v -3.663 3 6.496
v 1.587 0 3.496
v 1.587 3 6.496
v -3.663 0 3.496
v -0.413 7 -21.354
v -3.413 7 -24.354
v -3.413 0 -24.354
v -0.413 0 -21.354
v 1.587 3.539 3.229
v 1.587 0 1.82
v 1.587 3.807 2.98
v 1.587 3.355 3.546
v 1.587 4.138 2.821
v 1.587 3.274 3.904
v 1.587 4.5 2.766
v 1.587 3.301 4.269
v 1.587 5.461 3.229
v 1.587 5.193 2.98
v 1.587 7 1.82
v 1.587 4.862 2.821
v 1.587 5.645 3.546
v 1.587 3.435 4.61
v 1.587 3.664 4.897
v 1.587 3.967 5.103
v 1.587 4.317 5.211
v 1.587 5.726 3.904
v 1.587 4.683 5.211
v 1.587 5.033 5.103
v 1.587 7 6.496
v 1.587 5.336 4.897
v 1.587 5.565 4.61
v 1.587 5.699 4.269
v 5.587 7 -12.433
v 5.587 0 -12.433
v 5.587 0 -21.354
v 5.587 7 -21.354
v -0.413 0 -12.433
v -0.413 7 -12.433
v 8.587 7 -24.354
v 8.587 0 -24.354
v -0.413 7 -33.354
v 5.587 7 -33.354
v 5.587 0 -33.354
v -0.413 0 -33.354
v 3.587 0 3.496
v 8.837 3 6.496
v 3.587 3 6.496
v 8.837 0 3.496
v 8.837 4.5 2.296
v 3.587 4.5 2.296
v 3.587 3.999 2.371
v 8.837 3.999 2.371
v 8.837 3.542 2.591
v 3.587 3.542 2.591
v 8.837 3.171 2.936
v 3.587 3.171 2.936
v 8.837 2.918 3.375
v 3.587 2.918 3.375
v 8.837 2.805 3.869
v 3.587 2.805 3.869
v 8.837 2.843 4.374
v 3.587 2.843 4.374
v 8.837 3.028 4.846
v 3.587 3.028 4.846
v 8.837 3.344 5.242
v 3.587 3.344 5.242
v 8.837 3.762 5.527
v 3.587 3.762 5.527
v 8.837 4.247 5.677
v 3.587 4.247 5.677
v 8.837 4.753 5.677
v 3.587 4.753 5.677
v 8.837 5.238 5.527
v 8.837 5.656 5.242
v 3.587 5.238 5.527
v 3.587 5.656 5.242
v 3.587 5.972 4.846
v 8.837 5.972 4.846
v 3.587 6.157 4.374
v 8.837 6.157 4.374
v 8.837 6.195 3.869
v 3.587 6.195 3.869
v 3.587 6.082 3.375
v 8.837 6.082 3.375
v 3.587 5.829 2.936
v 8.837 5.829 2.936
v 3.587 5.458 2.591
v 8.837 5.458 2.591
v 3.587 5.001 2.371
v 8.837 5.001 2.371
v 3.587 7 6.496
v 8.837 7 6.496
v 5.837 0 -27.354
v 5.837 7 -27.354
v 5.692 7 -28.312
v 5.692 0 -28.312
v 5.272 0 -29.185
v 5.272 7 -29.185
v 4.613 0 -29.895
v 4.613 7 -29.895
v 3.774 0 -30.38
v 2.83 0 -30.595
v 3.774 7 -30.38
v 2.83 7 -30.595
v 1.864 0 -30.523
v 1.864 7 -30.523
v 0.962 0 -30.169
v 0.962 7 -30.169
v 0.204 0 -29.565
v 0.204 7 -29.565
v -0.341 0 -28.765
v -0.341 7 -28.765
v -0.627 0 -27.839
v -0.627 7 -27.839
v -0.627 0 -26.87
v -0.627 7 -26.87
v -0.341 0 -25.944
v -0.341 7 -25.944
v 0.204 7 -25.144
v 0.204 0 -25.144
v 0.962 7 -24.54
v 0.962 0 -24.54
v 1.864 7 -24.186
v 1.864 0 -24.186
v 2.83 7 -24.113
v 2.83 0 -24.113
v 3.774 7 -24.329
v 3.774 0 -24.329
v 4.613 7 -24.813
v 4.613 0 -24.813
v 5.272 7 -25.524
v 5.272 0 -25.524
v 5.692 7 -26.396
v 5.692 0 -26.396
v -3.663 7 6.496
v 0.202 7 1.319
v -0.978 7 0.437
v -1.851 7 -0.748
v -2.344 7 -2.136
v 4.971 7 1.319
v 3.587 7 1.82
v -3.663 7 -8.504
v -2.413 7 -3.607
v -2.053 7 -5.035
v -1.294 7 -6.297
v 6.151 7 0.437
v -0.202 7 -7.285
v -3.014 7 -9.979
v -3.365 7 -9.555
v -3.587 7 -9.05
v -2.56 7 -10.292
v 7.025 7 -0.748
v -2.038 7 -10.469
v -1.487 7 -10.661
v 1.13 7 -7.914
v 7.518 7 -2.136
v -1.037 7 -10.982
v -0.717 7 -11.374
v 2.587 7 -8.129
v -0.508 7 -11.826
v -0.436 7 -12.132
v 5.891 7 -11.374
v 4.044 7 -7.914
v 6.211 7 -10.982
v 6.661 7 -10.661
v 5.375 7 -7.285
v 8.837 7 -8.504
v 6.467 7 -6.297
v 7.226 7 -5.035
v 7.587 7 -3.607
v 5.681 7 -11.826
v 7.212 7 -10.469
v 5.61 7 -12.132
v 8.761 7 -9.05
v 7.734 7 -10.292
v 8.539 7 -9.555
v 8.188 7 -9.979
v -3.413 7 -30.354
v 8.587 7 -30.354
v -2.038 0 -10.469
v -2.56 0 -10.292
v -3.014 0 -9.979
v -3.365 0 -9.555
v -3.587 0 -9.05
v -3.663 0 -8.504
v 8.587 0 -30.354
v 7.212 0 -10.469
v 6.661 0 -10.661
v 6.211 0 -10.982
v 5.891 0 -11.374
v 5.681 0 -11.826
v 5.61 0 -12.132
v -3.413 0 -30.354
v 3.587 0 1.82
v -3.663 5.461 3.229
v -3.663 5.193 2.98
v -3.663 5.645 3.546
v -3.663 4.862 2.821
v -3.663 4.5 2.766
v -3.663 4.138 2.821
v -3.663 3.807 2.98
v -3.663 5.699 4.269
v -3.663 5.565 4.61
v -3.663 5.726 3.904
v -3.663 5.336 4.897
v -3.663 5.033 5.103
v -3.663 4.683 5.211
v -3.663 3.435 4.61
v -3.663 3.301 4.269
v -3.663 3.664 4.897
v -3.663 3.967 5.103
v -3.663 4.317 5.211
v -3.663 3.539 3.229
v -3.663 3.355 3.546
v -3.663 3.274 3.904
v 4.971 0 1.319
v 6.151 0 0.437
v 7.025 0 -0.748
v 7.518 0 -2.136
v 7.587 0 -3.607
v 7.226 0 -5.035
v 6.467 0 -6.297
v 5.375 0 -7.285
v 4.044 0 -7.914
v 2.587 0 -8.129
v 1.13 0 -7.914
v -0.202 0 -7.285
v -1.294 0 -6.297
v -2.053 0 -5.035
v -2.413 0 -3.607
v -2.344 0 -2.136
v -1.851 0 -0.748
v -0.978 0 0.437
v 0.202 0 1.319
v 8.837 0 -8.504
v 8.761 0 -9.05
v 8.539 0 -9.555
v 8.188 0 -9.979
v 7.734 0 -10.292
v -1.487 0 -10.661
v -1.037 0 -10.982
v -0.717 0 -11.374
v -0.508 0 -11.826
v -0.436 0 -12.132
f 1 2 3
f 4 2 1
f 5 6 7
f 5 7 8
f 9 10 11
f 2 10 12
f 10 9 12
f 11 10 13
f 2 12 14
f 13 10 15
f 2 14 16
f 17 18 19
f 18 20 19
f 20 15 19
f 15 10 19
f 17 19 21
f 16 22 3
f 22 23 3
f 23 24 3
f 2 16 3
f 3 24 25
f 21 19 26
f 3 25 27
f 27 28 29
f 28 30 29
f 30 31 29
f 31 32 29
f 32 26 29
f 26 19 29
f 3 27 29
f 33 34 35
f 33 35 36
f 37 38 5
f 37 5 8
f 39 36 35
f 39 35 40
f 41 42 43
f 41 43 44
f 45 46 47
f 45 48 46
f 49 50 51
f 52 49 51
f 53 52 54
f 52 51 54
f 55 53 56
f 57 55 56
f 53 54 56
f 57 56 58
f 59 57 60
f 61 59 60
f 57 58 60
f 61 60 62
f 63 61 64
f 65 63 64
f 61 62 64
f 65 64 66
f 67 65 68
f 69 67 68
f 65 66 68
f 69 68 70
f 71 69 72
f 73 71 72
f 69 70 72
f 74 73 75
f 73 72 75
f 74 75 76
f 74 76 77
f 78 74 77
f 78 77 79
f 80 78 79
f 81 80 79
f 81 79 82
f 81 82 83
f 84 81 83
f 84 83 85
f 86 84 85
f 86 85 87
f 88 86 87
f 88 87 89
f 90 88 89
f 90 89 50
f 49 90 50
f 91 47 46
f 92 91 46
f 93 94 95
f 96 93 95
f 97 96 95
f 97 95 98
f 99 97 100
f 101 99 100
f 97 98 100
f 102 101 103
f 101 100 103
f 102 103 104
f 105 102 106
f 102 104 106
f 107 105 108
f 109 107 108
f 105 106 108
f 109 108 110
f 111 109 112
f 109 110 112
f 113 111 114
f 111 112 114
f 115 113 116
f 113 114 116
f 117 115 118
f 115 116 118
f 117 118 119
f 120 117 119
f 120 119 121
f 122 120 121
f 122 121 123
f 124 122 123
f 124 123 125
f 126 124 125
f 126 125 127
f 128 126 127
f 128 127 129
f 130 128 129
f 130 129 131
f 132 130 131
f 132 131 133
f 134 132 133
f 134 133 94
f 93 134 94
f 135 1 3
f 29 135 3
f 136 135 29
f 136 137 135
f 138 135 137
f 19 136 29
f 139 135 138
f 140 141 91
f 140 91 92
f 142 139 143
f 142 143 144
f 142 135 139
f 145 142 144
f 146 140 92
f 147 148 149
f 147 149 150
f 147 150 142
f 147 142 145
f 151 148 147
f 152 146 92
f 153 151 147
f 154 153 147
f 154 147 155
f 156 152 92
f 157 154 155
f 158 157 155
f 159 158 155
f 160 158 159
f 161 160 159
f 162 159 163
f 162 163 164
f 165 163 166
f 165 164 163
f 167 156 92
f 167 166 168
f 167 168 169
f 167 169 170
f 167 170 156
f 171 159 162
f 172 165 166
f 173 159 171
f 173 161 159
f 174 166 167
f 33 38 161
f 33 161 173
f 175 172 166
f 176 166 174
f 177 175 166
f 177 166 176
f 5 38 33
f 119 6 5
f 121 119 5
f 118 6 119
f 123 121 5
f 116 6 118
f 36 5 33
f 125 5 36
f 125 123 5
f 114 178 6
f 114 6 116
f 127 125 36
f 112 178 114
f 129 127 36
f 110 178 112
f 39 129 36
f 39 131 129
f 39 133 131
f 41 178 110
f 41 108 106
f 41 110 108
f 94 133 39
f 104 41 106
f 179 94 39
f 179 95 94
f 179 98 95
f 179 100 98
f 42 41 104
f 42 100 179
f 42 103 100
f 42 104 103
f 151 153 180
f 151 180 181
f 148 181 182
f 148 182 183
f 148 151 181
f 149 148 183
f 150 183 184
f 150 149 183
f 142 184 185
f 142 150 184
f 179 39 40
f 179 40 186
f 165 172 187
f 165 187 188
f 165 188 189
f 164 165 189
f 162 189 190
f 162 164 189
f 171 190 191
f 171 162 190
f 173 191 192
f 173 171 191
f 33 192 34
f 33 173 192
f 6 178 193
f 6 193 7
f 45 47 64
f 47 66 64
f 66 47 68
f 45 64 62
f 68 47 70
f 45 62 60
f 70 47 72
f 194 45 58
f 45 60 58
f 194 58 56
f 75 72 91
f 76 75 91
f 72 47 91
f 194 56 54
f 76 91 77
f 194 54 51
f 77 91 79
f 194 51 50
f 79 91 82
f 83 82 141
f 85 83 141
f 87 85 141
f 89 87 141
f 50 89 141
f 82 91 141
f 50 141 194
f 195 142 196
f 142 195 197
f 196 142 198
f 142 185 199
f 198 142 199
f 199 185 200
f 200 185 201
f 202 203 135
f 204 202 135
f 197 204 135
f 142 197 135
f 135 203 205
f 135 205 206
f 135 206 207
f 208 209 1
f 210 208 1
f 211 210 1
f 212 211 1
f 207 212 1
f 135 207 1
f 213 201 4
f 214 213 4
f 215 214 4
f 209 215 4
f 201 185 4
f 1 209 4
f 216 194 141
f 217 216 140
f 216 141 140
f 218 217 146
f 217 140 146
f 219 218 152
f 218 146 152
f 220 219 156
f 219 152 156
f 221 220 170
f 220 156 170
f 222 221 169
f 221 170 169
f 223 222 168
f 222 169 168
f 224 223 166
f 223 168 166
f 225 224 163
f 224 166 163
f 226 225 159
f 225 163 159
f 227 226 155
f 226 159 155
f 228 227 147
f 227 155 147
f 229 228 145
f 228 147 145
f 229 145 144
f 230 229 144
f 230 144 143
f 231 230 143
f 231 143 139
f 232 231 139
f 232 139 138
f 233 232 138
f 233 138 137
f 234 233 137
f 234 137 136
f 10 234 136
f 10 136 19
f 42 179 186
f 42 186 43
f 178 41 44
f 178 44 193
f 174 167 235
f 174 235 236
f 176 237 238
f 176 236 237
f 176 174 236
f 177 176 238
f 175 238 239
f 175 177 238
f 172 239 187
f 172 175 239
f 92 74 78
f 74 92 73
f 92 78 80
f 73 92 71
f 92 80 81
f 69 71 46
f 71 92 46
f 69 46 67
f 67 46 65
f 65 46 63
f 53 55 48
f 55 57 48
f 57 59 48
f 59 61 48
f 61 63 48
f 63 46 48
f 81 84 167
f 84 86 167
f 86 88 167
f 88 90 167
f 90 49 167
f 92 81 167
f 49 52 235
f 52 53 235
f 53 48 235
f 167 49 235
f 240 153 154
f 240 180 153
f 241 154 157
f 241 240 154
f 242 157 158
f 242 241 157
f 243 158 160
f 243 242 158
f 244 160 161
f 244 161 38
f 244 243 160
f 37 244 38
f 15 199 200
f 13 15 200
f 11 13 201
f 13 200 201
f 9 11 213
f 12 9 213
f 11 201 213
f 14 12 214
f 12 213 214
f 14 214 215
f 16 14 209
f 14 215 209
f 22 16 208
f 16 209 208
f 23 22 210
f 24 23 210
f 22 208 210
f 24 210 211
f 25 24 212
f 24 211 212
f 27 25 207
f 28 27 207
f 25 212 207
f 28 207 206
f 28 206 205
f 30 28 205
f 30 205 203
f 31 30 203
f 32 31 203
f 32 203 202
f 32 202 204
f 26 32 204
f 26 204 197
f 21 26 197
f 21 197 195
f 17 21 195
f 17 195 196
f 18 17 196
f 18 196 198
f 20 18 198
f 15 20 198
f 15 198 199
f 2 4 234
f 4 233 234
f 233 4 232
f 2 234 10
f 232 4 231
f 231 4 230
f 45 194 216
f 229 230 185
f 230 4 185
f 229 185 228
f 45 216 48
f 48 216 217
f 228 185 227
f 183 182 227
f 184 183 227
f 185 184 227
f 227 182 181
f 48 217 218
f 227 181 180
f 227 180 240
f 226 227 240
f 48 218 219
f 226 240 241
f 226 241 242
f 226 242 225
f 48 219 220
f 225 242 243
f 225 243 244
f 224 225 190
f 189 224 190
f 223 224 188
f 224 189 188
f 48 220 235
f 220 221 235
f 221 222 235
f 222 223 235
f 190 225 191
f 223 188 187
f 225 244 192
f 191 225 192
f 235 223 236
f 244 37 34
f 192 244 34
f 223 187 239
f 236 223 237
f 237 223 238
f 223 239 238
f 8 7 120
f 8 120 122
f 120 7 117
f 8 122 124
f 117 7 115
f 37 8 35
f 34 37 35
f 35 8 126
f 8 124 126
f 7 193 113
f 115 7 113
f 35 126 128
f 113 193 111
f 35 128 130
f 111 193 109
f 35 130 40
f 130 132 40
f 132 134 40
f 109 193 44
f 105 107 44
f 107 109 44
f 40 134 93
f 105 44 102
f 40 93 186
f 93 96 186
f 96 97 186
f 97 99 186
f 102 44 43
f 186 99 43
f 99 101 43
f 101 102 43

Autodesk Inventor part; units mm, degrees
ref_plane "YZ Plane" through (0, 0, 0) normal (1, 0, 0) x (0, 1, 0)
ref_plane "XZ Plane" through (0, 0, 0) normal (0, 1, 0) x (-1, 0, 0)
ref_plane "XY Plane" through (0, 0, 0) normal (0, 0, 1) x (1, 0, 0)
sketch "Sketch1" plane through (0, 0, 0) normal (0, 1, 0) x (-1, 0, 0)
  line L0 (3.6632, 6.4956) -> (-8.8368, 6.4956)
  line L1 (-8.8368, 6.4956) -> (-8.8368, -10.5044)
  line L2 (-8.8368, -10.5044) -> (3.6632, -10.5044)
  line L3 (3.6632, -10.5044) -> (3.6632, 6.4956)
  line L4 (0.9132, -10.5044) -> (-6.0868, -10.5044)
  point P0 (0, 0)
  dimension "d0" = 17
  dimension "d1" = 12.5
extrude "Extrusion1" add sketch "Sketch1" along normal blind 7
chamfer "Chamfer1" distance 3 angle 45 1 edges at (2.5868, 0, 6.4956)
sketch "Sketch2" plane through (0, 7, 0) normal (0, 1, 0) x (1, 0, 0)
  circle A0 centre (2.5868, 3.1044) radius 5.025
  line L0 (8.8368, -6.4956) -> (8.8368, 10.5044) projected
  line L1 (-3.6632, -6.4956) -> (8.8368, -6.4956) projected
  point P0 (0, 0)
  dimension "d7" = 10.05
  dimension "d8" = 6.25
  dimension "d9" = 9.6
extrude "Extrusion2" cut sketch "Sketch2" against normal up to next
sketch "Sketch3" plane through (0, 7, 0) normal (0, 1, 0) x (1, 0, 0)
  line L0 (-3.6632, -6.4956) -> (8.8368, -6.4956) projected
  line L1 (1.5868, -6.4956) -> (3.5868, -6.4956)
  line L2 (3.5868, -6.4956) -> (3.5868, 0)
  line L3 (3.5868, 0) -> (1.5868, 0)
  line L4 (1.5868, 0) -> (1.5868, -6.4956)
  line L5 (8.8368, -6.4956) -> (8.8368, 10.5044) projected
  line L6 (-3.6632, 10.5044) -> (-3.6632, -6.4956) projected
  point P0 (0, 0)
  dimension "d16" = 2
  dimension "d17" = 12.5
  dimension "d18" = 5.25
extrude "Extrusion3" cut sketch "Sketch3" against normal through all
sketch "Sketch4" plane through (8.8368, 0, -10.5044) normal (1, 0, 0) x (0, 0, -1)
  line L0 (-17, 3) -> (-17, 7) projected
  line L1 (-17, 7) -> (0, 7) projected
  point P0 (-10.5044, 0)
  point P1 (-14.5, 4.5)
  dimension "d26" = 2.5
  dimension "d27" = 2.5
hole "Hole1" at (8.8368, 4.5, 3.9956) direction (-1, 0, 0) diameter 3.4 depth 5.25 clearance for "Flat Head Machine Screw" size "M3" standard "Ansi Metric M Profile"
sketch "Sketch5" plane through (1.5868, 7, 6.4956) normal (1, 0, 0) x (0, 0, -1)
  line L0 (0, 0) -> (17, 0) projected
  line L1 (0, -4) -> (0, 0) projected
  point P0 (6.4956, -7)
  point P1 (2.5, -2.5)
  dimension "d35" = 2.5
  dimension "d36" = 2.5
hole "Hole2" at (1.5868, 4.5, 3.9956) direction (-1, 0, 0) diameter 2.459 depth 5.25 thread size "M3x0.5" class "6H" standard "ANSI Metric M Profile"
sketch "Sketch6" plane through (8.8368, 0, -10.5044) normal (0, 0, -1) x (-1, 0, 0)
  line L0 (5.25, 7) -> (0, 7) projected
  line L1 (3.25, 7) -> (9.25, 7)
  line L2 (9.25, 7) -> (9.25, 0)
  line L3 (9.25, 0) -> (3.25, 0)
  line L4 (3.25, 0) -> (3.25, 7)
  line L5 (0, 0) -> (0, 7) projected
  point P0 (8.8368, 0)
  dimension "d40" = 6
  dimension "d41" = 7
  dimension "d42" = 3.25
extrude "Extrusion4" add sketch "Sketch6" along normal blind 10.85
fillet "Fillet1" radius 2 1 edges at (8.8368, 3.5, -10.5044)
fillet "Fillet2" radius 2 1 edges at (5.5868, 3.5, -10.5044)
fillet "Fillet3" radius 2 2 edges at (-3.6632, 3.5, -10.5044) (-0.4132, 3.5, -10.5044)
sketch "Sketch7" plane through (0, 7, 0) normal (0, 1, 0) x (1, 0, 0)
  point P0 (0, 0)
sketch "Sketch8" plane through (8.8368, 0, -21.3544) normal (0, 0, -1) x (-1, 0, 0)
  point P0 (8.8368, 0)
sketch "Sketch9" plane through (0, 7, 0) normal (0, 1, 0) x (1, 0, 0)
  line L0 (5.5868, 21.3544) -> (-0.4132, 21.3544) projected
  line L1 (5.5868, 21.3544) -> (8.5868, 24.3544)
  line L2 (8.5868, 24.3544) -> (8.5868, 30.3544)
  line L3 (-3.4132, 30.3544) -> (-3.4132, 24.3544)
  line L4 (-3.4132, 24.3544) -> (-0.4132, 21.3544)
  line L5 (8.5868, 30.3544) -> (5.5868, 33.3544)
  line L6 (5.5868, 33.3544) -> (-0.4132, 33.3544)
  line L7 (-0.4132, 33.3544) -> (-3.4132, 30.3544)
  line L8 (5.5868, 12.4335) -> (5.5868, 21.3544) projected
  line L9 (-0.4132, 12.4335) -> (-0.4132, 21.3544) projected
  point P0 (0, 0)
  dimension "d110" = 6
  dimension "d111" = 6
  dimension "d112" = 6
  dimension "d113" = 6
  dimension "d114" = 45
  dimension "d115" = 135
  dimension "d116" = 45
  dimension "d117" = 45
  dimension "d118" = 45
  dimension "d119" = 3
  dimension "d120" = 3
extrude "Extrusion5" add sketch "Sketch9" against normal blind 7
sketch "Sketch10" plane through (0, 7, 0) normal (0, 1, 0) x (1, 0, 0)
  circle A0 centre (2.5868, 27.3544) radius 3.25
  line L0 (5.5868, 33.3544) -> (-0.4132, 33.3544) projected
  line L1 (8.5868, 24.3544) -> (8.5868, 30.3544) projected
  line L2 (-3.4132, 30.3544) -> (-3.4132, 24.3544) projected
  point P0 (0, 0)
  dimension "d76" = 6.5
  dimension "d77" = 6
  dimension "d78" = 6
  dimension "d121" = 12
extrude "Extrusion6" cut sketch "Sketch10" against normal up to next
sketch "Sketch11" plane through (8.8368, 3, 6.4956) normal (1, 0, 0) x (0, 0, -1)
  point P0 (6.4956, -3)
sketch "Sketch12" plane through (5.8368, 0, -21.6044) normal (0.7071, 0, 0.7071) x (0.7071, 0, -0.7071)
  line L0 (-0.3536, 7) -> (3.8891, 7) projected
  line L1 (3.8891, 7) -> (3.8891, 0) projected
  point P0 (-19.4039, 0)
  dimension "d122" = 7
  dimension "d123" = 4.2426
hole "Hole3" [suppressed]
sketch "Sketch13" plane through (8.5868, 0, -30.3544) normal (0.7071, 0, -0.7071) x (-0.7071, 0, -0.7071)
  line L0 (4.2426, 7) -> (4.2426, 0) projected
  line L1 (4.2426, 0) -> (0, 0) projected
  point P0 (-15.392, 0)
hole "Hole4" [suppressed]
equation "\"d18\" = 0.5 * d17 - 0.5 * d16"
equation "\"d111\" = d110"
equation "\"d112\" = d110"
equation "\"d113\" = d110"
equation "\"d116\" = d114"
equation "\"d117\" = d116"
equation "\"d118\" = d117"
equation "\"d120\" = d119"
equation "\"d77\" = d78"
equation "\"d78\" = 0.5 * d121"
properties part number "dovetail stabilizer"
